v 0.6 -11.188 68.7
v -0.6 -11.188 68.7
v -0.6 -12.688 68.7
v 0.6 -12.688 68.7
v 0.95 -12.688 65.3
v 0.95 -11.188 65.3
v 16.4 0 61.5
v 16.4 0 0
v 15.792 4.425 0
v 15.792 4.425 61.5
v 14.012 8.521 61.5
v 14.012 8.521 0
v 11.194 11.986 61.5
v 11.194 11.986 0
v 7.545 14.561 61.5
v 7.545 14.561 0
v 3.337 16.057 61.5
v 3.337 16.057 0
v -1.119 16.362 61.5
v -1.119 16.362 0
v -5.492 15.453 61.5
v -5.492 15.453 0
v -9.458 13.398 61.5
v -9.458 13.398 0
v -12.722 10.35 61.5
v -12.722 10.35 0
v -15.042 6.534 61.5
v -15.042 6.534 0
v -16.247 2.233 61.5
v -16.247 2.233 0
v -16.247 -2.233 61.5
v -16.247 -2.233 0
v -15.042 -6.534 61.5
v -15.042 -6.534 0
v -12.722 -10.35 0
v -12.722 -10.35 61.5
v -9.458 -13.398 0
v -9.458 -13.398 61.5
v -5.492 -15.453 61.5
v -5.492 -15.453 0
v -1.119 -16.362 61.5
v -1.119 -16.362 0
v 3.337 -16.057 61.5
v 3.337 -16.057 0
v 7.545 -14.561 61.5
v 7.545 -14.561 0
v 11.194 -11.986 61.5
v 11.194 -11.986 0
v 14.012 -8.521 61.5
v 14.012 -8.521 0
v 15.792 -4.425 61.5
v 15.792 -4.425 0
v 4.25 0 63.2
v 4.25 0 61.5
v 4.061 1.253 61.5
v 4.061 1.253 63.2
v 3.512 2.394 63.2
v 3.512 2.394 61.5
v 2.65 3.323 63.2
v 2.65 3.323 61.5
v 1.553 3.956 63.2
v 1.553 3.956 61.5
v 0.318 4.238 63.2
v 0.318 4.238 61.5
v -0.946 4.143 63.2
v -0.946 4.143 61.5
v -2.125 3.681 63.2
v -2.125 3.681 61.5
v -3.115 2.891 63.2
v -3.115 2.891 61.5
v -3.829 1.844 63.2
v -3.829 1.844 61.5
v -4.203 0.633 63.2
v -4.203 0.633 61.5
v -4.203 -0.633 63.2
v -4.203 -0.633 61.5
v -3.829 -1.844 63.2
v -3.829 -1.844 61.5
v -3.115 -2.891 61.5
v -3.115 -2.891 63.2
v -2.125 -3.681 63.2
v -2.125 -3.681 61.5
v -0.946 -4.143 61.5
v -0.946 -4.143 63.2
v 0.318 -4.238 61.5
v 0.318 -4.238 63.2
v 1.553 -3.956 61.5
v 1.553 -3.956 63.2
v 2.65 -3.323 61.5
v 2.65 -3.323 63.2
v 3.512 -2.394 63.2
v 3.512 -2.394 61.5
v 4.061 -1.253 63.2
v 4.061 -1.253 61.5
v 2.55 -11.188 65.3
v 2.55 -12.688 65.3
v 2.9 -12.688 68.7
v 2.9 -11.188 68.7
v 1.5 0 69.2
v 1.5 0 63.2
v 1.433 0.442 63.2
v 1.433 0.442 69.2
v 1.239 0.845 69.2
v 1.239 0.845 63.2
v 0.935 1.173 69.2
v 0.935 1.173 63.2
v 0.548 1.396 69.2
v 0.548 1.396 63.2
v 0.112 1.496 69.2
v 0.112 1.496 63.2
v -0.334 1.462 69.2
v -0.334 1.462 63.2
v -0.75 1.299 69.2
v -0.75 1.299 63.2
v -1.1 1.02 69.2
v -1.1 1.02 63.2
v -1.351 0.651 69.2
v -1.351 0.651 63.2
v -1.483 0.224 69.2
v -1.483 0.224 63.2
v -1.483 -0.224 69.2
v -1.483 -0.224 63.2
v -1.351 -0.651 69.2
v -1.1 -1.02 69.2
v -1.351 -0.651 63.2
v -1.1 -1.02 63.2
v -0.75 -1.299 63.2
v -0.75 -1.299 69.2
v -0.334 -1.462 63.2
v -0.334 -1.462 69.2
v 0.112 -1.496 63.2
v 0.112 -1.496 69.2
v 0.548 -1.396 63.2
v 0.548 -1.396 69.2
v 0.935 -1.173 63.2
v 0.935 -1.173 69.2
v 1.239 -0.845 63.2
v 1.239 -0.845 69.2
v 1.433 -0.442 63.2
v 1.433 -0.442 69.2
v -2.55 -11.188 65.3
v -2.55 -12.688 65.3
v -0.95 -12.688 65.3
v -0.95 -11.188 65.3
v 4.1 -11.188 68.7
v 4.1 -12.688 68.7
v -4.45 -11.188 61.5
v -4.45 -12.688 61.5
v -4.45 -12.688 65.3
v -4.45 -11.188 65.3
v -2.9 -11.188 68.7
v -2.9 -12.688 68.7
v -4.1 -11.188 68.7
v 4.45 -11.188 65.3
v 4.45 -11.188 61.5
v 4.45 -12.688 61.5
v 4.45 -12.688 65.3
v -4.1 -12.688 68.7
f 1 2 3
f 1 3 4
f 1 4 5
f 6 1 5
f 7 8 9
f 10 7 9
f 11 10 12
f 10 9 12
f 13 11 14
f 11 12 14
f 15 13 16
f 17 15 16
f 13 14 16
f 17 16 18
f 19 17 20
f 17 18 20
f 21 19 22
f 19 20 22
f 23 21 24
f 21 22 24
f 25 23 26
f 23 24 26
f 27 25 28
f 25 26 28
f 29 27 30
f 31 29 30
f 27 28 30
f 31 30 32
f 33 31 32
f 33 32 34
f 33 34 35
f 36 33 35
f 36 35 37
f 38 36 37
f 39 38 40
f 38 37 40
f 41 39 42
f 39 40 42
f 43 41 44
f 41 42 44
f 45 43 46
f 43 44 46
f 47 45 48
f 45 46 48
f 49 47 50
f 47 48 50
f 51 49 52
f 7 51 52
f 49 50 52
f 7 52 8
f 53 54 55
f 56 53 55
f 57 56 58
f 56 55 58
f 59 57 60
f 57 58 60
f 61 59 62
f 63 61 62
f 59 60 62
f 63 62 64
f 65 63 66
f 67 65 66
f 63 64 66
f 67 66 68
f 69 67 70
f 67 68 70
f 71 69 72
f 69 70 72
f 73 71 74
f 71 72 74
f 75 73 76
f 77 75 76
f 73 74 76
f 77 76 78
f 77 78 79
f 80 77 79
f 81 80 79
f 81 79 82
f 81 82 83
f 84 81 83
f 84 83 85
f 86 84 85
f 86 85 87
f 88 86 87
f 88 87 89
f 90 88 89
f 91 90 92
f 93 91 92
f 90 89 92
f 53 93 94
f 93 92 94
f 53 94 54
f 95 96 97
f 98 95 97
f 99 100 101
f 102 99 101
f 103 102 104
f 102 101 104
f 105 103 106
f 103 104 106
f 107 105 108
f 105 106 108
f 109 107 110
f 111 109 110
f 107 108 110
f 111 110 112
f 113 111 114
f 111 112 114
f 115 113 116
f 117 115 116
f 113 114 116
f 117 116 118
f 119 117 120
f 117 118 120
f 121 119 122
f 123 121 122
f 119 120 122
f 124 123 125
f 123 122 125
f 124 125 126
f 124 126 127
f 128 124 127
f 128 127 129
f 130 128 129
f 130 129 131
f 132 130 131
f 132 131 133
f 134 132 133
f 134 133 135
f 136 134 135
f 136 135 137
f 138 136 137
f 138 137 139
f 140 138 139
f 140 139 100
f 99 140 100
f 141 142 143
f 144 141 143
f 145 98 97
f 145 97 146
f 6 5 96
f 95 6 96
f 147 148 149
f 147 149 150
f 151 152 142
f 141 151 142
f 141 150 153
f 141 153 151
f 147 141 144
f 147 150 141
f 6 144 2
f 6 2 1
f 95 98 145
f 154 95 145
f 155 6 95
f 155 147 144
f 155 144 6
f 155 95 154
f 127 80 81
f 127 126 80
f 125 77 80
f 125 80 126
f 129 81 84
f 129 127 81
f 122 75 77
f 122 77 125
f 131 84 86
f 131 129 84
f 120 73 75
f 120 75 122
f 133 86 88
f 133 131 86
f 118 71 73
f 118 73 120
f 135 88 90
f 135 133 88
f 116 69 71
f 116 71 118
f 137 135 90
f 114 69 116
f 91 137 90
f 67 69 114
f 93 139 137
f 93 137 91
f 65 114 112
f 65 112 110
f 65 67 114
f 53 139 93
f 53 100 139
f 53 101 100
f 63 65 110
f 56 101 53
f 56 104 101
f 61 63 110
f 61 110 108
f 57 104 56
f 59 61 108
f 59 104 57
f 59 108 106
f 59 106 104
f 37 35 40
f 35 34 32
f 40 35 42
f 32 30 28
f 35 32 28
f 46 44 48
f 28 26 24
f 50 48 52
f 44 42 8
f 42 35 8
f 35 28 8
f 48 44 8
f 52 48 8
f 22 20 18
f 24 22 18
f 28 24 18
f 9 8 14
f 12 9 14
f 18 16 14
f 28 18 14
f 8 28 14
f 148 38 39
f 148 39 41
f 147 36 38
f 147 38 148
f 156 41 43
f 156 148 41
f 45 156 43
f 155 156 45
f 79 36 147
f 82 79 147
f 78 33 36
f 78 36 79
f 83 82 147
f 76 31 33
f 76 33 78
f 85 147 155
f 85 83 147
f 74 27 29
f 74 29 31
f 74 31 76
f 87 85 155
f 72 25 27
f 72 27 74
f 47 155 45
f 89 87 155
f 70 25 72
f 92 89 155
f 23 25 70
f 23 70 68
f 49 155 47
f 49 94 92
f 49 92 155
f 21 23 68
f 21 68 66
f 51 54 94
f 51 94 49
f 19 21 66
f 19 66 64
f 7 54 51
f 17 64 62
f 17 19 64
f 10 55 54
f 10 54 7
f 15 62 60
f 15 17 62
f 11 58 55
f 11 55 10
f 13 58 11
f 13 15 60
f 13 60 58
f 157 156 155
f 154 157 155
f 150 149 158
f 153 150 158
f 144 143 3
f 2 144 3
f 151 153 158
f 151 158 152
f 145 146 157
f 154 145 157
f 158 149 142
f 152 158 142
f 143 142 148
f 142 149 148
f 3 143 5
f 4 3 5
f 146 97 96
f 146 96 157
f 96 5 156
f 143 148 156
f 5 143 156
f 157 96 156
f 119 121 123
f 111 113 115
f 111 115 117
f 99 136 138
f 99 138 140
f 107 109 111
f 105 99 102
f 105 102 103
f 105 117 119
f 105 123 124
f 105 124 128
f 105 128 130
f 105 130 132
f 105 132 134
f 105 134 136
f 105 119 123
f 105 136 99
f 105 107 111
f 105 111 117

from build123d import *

# Parameters (mm, degrees)
F0_R     = 16.4
F1_DEPTH = 61.5
F2_R     = 1.5
F3_DEPTH = 7.7
F4_R     = 4.25
F5_DEPTH = 1.7
F6_W     = 8.9
F6_H     = 1.5
F7_DEPTH = 7.2
F9_DEPTH = 1.5


with BuildPart() as f1:
    # F0 (on Top) → F1 (new body)
    with BuildSketch(Plane.XY):
        Circle(F0_R)
    extrude(amount=F1_DEPTH)

    # F2 (on face) → F3 (join)
    with BuildSketch(Plane.XY.offset(61.5)):
        Circle(F2_R)
    extrude(amount=F3_DEPTH)

    # F4 (on face) → F5 (join)
    with BuildSketch(Plane.XY.offset(61.5)):
        Circle(F4_R)
    extrude(amount=F5_DEPTH)

    # F6 (on face) → F7 (join)
    with BuildSketch(Plane.XY.offset(61.5)):
        with Locations((0, -11.93791)):
            Rectangle(F6_W, F6_H)
    extrude(amount=F7_DEPTH)

    # F8 (on face) → F9 (cut, through all)
    with BuildSketch(Plane.XZ.offset(12.68791)):
        Polygon((-4.45, 65.3), (-4.1, 68.7), (-4.45, 68.7), align=None)
        Polygon((-0.95, 65.3), (-0.6, 68.7), (-2.9, 68.7), (-2.55, 65.3), align=None)
        Polygon((2.9, 68.7), (0.6, 68.7), (0.95, 65.3), (2.55, 65.3), align=None)
        Polygon((4.45, 68.7), (4.1, 68.7), (4.45, 65.3), align=None)
    extrude(amount=-F9_DEPTH, mode=Mode.SUBTRACT)


solid = f1.part
